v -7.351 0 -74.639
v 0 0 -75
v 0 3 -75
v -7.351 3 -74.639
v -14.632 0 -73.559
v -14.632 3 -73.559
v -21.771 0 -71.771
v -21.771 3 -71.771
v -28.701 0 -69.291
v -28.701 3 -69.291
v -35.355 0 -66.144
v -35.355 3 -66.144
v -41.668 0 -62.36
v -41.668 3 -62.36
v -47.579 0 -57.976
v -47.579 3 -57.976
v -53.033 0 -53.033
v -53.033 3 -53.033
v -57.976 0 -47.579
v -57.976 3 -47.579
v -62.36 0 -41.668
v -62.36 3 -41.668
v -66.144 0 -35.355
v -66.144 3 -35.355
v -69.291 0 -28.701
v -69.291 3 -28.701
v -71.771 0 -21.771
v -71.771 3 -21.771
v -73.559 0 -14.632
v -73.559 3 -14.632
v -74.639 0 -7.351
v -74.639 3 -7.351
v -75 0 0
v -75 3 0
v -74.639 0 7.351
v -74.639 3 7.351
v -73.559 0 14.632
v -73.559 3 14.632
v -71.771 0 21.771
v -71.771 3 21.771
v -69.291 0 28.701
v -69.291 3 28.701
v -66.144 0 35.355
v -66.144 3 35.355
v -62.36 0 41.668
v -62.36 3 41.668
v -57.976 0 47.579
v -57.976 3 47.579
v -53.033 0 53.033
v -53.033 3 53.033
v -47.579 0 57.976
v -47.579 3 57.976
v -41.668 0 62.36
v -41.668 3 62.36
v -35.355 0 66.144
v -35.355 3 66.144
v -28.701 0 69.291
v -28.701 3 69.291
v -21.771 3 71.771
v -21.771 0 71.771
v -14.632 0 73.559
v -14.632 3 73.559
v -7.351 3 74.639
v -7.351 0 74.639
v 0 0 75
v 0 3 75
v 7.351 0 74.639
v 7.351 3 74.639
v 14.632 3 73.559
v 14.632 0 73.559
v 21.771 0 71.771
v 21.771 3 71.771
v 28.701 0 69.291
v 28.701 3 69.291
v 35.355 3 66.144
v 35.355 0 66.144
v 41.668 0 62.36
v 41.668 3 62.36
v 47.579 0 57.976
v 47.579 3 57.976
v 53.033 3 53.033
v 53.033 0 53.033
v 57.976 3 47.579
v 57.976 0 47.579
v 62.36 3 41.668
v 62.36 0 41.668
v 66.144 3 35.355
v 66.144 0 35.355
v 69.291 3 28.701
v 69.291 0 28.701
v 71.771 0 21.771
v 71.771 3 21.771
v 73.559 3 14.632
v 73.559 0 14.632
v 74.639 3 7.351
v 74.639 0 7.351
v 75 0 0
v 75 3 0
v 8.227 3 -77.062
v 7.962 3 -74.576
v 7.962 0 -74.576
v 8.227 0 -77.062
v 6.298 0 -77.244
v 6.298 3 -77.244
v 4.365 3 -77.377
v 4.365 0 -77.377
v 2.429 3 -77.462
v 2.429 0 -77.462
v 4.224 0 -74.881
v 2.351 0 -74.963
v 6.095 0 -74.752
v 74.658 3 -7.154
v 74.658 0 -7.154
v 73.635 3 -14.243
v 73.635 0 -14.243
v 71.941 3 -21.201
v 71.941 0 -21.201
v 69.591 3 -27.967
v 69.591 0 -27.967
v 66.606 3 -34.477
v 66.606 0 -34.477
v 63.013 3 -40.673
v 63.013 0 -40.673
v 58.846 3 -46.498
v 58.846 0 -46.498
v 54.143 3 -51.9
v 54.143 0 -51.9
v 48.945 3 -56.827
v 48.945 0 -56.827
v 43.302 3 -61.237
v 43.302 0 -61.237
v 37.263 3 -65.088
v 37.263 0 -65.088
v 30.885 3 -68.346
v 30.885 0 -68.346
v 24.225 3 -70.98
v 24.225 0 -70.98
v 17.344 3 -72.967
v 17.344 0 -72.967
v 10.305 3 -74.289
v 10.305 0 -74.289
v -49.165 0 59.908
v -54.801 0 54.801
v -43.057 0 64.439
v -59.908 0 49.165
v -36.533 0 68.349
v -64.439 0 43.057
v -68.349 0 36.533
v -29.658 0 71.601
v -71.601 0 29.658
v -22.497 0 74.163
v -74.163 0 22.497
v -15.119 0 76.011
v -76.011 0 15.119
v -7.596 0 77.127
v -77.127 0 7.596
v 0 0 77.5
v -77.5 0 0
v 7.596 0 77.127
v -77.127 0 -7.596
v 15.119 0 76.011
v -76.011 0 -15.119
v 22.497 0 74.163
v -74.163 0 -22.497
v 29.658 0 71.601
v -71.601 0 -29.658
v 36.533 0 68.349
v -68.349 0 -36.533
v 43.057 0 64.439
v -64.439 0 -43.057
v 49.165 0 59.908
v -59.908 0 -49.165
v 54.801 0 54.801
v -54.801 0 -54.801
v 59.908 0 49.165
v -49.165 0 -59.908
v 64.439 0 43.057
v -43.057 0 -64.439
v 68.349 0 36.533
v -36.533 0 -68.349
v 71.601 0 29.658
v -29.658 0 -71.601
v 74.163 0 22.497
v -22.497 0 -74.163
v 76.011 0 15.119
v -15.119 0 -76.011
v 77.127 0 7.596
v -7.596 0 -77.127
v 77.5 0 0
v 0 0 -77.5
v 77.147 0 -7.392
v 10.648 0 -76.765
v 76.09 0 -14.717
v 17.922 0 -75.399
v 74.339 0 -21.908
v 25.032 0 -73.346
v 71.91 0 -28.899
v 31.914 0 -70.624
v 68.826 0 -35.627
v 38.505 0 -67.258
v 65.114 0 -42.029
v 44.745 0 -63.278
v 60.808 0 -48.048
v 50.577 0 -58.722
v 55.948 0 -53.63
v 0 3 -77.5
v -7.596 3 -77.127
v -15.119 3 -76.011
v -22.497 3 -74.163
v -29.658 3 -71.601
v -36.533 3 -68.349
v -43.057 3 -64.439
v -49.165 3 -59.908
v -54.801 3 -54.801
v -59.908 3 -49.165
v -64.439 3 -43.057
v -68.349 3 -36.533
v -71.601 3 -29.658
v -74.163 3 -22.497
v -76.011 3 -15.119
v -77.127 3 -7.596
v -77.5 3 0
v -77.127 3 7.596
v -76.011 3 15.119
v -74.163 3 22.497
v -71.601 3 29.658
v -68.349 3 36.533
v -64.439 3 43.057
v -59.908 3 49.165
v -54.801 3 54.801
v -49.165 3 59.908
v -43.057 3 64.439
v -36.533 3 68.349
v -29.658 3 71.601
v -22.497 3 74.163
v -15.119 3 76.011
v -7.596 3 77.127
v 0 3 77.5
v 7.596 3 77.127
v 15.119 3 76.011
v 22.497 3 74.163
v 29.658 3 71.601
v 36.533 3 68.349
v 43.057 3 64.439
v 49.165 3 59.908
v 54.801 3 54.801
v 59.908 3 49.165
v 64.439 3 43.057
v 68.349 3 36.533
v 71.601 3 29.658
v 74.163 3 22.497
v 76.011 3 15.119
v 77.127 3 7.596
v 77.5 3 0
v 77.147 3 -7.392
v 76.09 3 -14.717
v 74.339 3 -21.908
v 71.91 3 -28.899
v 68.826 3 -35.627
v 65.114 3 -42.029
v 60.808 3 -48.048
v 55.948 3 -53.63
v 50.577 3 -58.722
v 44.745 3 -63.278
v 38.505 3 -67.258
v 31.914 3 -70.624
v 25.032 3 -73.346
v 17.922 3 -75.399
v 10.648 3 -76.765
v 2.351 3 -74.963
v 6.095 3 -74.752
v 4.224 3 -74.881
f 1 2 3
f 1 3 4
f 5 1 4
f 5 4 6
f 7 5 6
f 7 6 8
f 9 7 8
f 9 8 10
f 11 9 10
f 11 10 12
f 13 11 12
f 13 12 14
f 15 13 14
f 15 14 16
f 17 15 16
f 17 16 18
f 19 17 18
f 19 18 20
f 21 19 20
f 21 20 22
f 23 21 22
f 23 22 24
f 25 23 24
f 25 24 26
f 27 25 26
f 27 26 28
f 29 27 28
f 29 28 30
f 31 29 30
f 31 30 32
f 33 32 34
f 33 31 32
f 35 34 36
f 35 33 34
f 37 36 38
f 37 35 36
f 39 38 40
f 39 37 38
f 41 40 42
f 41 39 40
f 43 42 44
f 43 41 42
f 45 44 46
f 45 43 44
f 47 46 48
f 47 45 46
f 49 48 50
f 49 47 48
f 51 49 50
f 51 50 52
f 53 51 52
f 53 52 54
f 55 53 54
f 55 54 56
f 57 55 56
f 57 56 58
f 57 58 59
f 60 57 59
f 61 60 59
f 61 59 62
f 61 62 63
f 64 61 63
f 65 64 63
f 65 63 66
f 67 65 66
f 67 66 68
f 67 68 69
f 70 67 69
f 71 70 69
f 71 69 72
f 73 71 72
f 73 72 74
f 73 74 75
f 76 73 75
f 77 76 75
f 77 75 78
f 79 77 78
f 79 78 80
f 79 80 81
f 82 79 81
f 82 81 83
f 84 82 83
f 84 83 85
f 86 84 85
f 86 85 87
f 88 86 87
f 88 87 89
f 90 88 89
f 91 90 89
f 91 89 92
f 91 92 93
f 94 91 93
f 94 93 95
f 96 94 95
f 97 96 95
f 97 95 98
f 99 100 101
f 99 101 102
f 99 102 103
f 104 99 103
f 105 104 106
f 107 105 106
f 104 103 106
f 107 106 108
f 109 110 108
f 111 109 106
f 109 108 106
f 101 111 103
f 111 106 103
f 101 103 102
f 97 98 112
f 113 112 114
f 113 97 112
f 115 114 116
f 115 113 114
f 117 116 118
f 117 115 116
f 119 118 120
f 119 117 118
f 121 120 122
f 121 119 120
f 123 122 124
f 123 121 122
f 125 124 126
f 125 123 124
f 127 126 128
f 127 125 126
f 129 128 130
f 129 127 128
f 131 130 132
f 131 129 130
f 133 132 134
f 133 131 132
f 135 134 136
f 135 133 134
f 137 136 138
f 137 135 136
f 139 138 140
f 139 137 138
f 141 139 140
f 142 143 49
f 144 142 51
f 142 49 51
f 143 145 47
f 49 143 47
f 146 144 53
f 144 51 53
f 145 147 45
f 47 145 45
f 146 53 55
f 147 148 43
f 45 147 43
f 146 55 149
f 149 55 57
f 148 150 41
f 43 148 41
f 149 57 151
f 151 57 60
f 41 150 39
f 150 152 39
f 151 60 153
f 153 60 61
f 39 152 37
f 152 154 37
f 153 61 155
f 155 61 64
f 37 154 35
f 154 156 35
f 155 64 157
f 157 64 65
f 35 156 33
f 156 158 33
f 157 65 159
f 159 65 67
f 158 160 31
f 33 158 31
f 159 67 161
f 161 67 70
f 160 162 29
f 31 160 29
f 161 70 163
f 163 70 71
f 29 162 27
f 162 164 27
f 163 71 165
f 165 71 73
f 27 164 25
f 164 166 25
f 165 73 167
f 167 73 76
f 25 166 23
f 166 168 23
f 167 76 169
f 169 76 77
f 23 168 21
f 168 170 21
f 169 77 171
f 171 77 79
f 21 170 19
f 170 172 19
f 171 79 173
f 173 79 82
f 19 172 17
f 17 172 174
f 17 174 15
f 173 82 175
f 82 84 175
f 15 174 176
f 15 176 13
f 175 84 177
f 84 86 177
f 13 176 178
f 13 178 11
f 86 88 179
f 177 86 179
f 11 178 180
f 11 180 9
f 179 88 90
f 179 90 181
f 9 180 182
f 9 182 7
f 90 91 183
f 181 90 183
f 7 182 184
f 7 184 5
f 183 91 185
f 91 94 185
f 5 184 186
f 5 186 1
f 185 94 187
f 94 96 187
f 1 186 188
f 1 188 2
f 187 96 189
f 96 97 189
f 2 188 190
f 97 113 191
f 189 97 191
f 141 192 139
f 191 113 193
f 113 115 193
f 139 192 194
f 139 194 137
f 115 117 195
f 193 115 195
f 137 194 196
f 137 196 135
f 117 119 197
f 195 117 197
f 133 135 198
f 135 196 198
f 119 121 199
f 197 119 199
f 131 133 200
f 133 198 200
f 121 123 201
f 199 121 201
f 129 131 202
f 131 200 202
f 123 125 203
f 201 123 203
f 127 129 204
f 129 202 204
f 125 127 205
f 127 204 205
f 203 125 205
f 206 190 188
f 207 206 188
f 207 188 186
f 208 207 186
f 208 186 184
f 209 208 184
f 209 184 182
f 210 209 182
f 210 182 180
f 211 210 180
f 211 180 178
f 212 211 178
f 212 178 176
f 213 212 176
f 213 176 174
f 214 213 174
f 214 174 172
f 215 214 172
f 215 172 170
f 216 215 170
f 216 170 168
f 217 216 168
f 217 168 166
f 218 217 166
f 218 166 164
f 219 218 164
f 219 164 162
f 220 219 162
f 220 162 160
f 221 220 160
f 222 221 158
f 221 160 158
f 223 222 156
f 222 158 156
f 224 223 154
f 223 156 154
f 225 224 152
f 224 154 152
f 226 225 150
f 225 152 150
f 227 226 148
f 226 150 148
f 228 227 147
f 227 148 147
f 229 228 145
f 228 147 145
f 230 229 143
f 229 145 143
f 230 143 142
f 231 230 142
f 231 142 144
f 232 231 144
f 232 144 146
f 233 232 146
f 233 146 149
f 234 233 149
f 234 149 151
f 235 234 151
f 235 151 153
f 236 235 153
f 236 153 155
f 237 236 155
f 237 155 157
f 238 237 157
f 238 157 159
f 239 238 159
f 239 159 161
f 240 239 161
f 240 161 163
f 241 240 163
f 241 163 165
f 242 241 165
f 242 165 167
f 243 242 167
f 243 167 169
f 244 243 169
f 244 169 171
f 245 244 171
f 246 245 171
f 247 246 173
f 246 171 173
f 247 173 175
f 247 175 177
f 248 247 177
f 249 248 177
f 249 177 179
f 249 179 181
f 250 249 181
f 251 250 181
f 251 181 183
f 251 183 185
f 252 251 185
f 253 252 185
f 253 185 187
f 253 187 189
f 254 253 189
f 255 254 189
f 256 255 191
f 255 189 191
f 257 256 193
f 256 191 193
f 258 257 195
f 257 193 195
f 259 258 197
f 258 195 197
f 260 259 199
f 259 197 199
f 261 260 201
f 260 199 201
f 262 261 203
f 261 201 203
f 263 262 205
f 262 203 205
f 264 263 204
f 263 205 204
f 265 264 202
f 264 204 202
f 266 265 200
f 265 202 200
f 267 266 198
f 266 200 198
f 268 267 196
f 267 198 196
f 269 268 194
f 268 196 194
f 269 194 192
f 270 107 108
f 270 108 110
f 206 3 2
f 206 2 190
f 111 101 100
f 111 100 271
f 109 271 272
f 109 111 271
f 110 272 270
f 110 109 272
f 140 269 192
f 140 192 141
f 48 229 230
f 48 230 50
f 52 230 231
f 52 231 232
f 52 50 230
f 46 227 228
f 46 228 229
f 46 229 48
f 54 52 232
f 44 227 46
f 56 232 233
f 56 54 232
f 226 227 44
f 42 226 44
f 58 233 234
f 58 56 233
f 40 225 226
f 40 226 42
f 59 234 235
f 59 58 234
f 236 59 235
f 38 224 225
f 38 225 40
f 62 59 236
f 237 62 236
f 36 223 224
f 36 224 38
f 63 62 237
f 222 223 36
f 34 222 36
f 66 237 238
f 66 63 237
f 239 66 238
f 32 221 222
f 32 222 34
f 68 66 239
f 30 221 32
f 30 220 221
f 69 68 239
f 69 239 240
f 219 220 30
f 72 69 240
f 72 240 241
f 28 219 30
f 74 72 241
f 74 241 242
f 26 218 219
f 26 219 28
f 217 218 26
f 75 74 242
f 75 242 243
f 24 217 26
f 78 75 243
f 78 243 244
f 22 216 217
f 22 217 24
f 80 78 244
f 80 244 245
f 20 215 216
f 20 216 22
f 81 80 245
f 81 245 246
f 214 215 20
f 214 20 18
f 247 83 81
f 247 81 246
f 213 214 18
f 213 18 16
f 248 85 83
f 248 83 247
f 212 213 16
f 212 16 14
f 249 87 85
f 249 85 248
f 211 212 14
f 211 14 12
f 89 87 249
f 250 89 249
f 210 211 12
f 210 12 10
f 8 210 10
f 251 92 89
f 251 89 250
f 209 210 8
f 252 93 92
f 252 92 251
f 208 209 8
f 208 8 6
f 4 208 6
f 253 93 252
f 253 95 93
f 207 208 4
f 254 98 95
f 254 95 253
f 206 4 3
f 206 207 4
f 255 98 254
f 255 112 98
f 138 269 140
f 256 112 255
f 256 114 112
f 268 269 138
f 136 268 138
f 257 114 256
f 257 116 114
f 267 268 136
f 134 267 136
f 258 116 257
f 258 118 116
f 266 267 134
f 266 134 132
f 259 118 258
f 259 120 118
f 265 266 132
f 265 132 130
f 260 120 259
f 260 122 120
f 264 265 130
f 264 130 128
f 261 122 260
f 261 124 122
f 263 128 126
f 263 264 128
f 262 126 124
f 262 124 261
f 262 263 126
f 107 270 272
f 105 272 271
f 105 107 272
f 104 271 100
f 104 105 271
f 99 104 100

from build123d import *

# Parameters (mm, degrees)
SKETCH1_R               = 77.5
SKETCH1_R_2             = 75
BOSS_EXTRUDE1_DEPTH     = 3
CUT_EXTRUDE1_DEPTH      = 1
CUT_EXTRUDE1_DEPTH_BACK = 4


with BuildPart() as part:
    # Sketch1 → Boss-Extrude1 (new body)
    with BuildSketch(Plane(origin=(0, 0, 0), x_dir=(1, 0, 0), z_dir=(0, 1, 0))):
        Circle(SKETCH1_R)
        Circle(SKETCH1_R_2, mode=Mode.SUBTRACT)
    extrude(amount=BOSS_EXTRUDE1_DEPTH)

    # Sketch2 → Cut-Extrude1 (cut, two sides)
    with BuildSketch(Plane(origin=(0, 3, 0), x_dir=(1, 0, 0), z_dir=(0, 1, 0))) as cut_extrude1_sk:
        with BuildLine():
            Line((0, 75), (0, 77.5))
            ThreePointArc((0, 77.5), (1.214872553, 77.490477381), (2.429446556, 77.461911863))
            Line((2.429446556, 77.461911863), (2.351077312, 74.963140512))
            ThreePointArc((2.351077312, 74.963140512), (1.175683115, 74.990784562), (0, 75))
        make_face()
        with BuildLine():
            Line((7.961891365, 74.576191146), (8.227287744, 77.062064185))
            ThreePointArc((8.227287744, 77.062064185), (9.438939304, 76.923056572), (10.648253025, 76.764996629))
            Line((10.648253025, 76.764996629), (10.304755556, 74.28870717))
            ThreePointArc((10.304755556, 74.28870717), (9.134454673, 74.441668027), (7.961891365, 74.576191146))
        make_face()
    extrude(amount=CUT_EXTRUDE1_DEPTH, mode=Mode.SUBTRACT)
    extrude(cut_extrude1_sk.sketch, amount=-CUT_EXTRUDE1_DEPTH_BACK, mode=Mode.SUBTRACT)


solid = part.part
